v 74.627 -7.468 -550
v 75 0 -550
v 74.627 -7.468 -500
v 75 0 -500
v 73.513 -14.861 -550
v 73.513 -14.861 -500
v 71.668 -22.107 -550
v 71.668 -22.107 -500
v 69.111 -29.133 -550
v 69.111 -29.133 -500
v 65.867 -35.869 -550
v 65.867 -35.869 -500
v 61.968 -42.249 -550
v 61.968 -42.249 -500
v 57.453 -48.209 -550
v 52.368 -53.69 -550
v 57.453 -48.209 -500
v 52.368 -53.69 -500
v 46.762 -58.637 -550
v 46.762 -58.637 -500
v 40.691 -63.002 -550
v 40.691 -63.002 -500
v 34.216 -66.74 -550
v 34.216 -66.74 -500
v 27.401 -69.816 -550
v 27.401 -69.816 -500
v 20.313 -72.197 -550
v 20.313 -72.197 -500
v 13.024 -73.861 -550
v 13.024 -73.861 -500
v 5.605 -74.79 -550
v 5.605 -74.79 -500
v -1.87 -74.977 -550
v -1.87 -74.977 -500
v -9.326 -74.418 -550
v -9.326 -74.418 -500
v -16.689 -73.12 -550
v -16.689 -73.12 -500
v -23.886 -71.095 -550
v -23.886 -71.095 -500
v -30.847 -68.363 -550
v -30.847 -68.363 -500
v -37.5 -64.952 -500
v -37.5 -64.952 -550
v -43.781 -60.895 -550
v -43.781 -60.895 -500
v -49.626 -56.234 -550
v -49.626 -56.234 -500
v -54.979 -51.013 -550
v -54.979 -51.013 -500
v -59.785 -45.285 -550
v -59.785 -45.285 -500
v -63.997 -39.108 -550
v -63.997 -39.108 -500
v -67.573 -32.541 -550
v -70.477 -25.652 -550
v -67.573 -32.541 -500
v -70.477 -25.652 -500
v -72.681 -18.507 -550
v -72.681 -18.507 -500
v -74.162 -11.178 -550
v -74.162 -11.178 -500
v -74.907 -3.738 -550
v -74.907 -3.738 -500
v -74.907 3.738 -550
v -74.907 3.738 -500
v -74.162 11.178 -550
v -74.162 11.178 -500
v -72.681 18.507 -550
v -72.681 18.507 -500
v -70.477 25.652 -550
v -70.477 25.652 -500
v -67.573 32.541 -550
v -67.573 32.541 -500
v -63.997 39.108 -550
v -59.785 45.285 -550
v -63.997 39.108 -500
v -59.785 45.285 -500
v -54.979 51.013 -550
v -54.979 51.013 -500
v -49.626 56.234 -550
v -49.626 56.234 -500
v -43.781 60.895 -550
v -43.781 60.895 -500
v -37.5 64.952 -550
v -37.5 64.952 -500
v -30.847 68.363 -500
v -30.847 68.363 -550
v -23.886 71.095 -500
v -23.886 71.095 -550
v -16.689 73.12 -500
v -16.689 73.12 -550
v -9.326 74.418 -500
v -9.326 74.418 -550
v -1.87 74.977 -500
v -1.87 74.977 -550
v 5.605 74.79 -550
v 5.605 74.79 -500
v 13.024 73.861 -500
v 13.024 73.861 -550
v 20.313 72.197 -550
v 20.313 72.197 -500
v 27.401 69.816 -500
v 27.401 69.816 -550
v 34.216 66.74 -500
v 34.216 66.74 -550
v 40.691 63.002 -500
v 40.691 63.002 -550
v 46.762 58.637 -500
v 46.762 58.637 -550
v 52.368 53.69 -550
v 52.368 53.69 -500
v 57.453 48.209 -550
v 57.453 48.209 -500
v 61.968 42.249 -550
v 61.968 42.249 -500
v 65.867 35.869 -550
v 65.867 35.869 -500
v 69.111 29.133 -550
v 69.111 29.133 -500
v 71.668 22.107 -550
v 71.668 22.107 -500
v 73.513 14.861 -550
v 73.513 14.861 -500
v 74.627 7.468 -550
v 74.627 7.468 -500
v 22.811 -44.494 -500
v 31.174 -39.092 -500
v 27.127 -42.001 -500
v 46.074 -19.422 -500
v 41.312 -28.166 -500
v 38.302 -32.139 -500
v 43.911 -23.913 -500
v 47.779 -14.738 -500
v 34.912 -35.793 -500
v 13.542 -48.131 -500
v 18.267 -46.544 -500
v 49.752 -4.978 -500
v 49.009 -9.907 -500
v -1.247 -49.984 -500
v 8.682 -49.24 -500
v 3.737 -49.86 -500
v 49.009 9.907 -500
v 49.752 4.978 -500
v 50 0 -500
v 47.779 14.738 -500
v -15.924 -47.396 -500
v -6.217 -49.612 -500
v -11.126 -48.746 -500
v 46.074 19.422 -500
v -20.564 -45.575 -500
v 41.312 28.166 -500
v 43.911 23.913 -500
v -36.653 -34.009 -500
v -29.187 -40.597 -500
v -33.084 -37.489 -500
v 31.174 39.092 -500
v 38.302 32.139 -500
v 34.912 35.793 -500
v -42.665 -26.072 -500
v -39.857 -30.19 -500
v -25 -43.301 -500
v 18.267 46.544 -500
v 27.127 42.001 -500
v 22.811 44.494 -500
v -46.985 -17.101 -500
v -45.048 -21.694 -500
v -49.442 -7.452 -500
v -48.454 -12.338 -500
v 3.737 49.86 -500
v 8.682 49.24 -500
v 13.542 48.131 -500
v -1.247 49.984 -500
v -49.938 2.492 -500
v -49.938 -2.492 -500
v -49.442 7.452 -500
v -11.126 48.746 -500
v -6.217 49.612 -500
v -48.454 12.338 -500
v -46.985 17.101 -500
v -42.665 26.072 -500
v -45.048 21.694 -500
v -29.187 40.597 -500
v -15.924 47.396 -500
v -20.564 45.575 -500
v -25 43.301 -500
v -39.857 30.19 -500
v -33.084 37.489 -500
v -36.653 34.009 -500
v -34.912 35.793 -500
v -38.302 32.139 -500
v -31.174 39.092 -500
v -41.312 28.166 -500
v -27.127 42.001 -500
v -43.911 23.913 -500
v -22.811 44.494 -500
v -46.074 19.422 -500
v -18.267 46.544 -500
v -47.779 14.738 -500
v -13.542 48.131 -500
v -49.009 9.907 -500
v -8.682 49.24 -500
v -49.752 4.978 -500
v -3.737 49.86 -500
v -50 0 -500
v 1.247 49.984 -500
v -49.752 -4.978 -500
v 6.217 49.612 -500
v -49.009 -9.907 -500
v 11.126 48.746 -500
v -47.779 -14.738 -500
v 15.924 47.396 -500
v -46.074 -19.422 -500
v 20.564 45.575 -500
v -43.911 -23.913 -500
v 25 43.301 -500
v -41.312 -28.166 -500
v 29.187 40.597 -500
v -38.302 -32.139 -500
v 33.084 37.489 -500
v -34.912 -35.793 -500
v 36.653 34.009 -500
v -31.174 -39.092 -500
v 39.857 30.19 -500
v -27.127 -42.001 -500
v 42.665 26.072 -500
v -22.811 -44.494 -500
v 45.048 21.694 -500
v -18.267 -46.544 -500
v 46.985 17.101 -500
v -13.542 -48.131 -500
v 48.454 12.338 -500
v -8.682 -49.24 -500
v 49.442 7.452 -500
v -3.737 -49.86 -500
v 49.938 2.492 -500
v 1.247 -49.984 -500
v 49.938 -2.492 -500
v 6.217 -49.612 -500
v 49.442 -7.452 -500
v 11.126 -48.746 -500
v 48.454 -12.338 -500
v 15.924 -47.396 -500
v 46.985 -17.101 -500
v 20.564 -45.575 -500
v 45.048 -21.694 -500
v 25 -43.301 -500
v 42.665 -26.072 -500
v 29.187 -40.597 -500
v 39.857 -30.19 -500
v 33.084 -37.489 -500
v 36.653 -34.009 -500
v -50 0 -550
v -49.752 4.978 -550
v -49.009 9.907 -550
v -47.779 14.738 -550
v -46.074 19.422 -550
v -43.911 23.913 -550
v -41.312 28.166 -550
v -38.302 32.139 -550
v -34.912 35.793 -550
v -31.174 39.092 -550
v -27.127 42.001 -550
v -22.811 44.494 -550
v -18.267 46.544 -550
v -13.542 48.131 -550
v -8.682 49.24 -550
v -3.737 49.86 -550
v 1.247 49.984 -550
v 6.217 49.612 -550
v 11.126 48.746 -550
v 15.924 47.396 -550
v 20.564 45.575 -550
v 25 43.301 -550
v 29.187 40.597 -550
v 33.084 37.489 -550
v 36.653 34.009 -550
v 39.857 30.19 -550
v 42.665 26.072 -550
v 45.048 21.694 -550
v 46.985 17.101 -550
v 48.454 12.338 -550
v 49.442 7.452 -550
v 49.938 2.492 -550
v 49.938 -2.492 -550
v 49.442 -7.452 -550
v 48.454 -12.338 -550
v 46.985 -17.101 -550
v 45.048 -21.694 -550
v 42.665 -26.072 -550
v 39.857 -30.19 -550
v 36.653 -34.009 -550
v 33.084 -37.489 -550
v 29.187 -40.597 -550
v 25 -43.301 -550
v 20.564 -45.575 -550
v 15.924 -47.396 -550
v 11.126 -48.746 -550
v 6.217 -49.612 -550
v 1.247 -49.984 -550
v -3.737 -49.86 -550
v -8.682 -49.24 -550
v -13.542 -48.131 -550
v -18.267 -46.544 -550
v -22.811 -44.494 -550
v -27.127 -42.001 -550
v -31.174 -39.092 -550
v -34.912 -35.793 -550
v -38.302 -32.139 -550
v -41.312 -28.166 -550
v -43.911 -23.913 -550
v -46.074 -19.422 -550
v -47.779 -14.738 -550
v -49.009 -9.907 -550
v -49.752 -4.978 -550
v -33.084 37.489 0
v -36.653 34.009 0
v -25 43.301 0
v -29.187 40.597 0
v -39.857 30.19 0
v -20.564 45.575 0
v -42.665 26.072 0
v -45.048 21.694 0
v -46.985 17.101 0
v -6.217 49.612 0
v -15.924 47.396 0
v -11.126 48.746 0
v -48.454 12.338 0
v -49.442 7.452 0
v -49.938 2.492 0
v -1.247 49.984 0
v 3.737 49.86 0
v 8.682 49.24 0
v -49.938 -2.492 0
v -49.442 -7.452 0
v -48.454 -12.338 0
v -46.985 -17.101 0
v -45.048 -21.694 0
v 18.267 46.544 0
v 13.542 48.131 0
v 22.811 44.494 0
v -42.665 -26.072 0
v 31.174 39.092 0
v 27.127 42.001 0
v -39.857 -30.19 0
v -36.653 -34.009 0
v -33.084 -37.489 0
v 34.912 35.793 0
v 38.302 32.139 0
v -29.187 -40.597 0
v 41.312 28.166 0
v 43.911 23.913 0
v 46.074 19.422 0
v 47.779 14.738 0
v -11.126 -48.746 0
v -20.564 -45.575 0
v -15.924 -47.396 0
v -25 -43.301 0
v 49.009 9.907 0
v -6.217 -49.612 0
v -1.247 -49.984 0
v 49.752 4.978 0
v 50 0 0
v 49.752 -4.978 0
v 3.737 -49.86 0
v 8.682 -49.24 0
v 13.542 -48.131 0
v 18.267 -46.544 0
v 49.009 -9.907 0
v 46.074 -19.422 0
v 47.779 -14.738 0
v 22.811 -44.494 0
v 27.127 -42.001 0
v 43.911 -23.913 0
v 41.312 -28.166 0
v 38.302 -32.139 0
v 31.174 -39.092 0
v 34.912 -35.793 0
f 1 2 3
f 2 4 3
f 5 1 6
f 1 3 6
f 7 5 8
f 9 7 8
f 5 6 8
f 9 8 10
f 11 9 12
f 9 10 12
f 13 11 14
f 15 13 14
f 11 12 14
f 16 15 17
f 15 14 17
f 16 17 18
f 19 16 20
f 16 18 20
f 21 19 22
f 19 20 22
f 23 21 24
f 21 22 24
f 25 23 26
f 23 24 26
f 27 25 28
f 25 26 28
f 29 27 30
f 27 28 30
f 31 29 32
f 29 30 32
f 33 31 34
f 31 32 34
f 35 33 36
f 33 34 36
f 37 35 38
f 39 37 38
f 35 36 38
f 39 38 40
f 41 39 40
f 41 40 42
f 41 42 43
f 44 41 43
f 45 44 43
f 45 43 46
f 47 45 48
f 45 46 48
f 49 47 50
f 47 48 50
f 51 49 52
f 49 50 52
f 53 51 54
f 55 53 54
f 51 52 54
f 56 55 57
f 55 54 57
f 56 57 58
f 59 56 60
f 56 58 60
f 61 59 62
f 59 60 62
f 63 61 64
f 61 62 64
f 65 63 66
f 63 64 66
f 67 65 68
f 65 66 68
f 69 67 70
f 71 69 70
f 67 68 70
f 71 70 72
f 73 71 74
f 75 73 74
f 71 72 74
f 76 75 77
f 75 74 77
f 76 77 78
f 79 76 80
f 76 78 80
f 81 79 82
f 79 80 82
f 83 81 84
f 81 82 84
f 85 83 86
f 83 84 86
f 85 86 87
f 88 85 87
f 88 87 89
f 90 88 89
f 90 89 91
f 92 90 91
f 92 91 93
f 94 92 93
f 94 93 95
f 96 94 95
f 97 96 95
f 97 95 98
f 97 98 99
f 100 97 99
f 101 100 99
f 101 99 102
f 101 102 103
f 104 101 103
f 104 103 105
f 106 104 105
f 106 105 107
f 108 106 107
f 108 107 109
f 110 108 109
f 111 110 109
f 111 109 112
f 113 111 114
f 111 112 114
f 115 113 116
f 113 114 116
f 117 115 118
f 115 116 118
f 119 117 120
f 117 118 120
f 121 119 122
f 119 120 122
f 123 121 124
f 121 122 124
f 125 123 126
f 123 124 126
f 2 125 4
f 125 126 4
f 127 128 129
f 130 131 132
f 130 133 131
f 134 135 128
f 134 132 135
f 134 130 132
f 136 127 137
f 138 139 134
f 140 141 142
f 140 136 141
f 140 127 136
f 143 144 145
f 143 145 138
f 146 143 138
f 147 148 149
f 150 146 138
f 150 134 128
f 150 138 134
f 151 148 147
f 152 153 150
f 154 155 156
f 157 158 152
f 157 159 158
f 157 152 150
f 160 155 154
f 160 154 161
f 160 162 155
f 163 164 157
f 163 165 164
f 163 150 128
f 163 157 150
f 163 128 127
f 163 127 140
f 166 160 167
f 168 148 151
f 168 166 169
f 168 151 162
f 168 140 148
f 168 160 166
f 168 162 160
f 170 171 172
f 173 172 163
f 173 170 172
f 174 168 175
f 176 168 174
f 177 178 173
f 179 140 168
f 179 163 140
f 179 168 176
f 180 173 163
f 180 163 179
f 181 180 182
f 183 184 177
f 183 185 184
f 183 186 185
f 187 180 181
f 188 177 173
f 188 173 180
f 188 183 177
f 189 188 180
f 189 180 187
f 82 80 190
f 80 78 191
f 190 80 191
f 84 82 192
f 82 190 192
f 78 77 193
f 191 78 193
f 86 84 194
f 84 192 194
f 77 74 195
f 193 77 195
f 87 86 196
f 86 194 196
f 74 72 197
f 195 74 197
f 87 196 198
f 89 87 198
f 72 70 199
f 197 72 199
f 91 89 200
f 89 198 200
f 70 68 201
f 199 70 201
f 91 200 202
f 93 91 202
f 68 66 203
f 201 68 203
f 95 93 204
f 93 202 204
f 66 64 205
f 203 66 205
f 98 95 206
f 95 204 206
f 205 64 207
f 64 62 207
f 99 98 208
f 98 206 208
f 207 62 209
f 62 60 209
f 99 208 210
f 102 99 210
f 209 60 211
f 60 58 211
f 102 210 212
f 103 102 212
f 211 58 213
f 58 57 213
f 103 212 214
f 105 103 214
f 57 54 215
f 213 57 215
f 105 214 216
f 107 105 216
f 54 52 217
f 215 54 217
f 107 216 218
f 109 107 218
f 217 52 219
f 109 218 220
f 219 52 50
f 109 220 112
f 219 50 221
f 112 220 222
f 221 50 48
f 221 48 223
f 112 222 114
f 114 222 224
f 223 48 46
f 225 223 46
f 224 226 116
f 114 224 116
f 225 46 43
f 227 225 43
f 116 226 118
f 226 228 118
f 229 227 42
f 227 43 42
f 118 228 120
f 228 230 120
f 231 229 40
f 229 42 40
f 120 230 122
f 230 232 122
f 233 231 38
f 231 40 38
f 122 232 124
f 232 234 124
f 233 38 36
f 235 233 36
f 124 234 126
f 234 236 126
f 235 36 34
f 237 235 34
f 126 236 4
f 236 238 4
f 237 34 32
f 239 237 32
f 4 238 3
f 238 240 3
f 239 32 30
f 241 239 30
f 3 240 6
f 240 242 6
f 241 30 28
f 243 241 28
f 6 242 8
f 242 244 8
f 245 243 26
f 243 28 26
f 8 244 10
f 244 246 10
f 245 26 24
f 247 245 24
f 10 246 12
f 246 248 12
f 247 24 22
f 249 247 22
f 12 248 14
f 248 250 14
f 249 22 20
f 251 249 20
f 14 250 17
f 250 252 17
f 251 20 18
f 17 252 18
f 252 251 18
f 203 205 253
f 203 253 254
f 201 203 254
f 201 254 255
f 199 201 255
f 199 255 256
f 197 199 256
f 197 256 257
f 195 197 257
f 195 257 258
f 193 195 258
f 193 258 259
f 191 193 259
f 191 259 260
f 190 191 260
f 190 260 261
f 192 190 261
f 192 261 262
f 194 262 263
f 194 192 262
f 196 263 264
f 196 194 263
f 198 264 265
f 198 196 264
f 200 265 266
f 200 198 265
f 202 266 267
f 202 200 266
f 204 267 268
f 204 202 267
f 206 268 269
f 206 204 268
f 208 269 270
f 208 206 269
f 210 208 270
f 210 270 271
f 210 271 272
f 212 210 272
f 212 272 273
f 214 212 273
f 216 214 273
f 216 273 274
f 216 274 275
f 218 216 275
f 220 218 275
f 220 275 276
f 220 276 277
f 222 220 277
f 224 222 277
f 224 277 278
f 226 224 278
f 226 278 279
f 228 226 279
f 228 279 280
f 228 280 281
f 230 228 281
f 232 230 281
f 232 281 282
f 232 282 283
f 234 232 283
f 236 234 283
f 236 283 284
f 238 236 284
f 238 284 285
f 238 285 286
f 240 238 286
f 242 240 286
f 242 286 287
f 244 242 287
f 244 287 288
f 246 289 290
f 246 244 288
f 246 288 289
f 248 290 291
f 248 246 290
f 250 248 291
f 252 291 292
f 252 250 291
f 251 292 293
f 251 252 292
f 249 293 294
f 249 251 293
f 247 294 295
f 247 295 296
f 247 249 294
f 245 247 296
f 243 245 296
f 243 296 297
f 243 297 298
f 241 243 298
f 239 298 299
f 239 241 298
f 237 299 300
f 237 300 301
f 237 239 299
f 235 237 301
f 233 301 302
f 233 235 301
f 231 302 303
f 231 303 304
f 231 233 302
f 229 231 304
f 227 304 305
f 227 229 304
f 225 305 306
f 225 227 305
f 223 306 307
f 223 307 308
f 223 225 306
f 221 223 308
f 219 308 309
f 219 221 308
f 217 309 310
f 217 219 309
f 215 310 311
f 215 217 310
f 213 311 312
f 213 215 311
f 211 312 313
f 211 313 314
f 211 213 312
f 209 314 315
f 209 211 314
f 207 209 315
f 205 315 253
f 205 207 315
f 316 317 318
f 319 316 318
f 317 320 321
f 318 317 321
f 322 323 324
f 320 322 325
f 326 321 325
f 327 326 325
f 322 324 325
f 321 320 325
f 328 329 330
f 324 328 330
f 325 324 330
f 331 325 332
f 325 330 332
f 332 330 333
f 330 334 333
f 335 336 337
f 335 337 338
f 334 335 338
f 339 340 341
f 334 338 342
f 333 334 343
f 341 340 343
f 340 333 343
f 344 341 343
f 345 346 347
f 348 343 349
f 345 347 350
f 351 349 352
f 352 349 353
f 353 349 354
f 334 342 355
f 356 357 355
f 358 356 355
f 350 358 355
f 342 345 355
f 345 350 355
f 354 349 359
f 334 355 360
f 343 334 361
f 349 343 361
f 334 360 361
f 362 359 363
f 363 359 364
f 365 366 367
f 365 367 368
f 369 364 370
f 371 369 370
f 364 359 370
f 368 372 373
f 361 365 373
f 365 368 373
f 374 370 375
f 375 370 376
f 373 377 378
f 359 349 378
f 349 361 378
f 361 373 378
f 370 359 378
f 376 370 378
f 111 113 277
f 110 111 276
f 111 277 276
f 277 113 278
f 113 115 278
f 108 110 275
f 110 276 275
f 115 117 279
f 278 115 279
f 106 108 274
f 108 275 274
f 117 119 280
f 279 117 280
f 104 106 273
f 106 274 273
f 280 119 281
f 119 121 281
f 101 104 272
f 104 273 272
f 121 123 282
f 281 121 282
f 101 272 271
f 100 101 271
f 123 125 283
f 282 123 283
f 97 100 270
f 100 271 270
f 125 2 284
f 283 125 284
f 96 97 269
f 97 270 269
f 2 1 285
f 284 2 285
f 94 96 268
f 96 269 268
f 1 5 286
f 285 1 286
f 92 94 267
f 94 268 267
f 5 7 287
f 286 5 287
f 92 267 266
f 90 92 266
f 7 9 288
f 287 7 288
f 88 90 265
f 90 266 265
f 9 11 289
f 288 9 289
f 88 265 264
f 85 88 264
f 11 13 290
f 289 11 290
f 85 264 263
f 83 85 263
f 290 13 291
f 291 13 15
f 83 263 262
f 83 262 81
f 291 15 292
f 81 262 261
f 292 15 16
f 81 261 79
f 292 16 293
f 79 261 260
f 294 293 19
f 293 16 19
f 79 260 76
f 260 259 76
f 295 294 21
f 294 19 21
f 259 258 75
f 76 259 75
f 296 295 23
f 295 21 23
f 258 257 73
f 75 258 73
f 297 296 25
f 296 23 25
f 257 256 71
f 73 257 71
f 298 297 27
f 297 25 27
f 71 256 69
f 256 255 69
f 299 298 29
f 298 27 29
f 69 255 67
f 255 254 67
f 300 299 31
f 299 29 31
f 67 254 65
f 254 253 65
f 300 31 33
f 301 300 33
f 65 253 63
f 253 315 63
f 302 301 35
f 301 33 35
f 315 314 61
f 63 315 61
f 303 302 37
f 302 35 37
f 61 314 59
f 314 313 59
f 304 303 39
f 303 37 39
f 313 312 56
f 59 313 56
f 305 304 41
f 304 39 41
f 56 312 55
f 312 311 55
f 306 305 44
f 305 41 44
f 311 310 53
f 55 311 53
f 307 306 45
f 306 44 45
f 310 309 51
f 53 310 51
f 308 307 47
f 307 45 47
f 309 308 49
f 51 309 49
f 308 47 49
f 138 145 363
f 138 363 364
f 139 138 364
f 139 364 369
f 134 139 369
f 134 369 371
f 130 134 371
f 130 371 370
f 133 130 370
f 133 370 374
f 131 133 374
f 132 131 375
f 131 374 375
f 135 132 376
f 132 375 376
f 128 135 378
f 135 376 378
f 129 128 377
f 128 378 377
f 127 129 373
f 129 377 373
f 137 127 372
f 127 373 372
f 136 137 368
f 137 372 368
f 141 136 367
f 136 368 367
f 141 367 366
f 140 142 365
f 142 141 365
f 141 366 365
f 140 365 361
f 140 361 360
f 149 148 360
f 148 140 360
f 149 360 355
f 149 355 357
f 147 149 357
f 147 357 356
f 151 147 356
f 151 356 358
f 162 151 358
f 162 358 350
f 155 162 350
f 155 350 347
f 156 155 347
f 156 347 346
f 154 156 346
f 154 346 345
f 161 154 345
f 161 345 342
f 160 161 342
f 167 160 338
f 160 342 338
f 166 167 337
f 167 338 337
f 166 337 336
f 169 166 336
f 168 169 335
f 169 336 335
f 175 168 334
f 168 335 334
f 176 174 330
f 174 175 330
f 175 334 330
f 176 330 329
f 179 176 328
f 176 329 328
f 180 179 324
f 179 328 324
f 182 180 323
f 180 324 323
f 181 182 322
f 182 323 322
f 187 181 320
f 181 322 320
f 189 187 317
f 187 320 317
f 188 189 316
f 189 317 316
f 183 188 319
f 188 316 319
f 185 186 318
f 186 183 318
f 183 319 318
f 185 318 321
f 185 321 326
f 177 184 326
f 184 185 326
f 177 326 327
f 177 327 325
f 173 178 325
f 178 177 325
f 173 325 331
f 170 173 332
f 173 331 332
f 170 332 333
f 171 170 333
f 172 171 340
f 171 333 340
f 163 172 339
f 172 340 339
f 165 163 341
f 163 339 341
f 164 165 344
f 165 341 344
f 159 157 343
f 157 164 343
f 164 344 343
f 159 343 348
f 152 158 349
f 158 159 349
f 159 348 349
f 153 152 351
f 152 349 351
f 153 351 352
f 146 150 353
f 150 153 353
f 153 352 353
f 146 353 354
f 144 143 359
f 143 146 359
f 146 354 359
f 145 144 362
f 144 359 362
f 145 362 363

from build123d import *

# Parameters (mm, degrees)
CUT_EXTRUDE2_START = -50
SKETCH4_R          = 50
CUT_EXTRUDE2_DEPTH = 50


with BuildPart() as part:
    # Sketch2 → Revolve1 (revolve)
    with BuildSketch(Plane(origin=(0, 0, 0), x_dir=(0, 0, -1), z_dir=(1, 0, 0)), mode=Mode.PRIVATE) as revolve1_sk:
        Polygon((0, 0), (550, 0), (550, -75), (500, -75), (500, -50), (0, -50), align=None)
    revolve(revolve1_sk.sketch.rotate(Axis((0, 0, 0), (0, 0, -1)), 270), axis=Axis((0, 0, 0), (0, 0, -1)))

    # Sketch4 → Cut-Extrude2 (cut)
    with BuildSketch(Plane(origin=(0, 0, -550), x_dir=(-1, 0, 0), z_dir=(0, 0, -1)).offset(CUT_EXTRUDE2_START)):
        Circle(SKETCH4_R)
    extrude(amount=CUT_EXTRUDE2_DEPTH, mode=Mode.SUBTRACT)


with BuildPart() as cut_extrude2_piece_1:
    # of the separate pieces the step leaves, piece 1, a body of its own (cut_extrude2_pieces)
    add(part.part.solids().sort_by_distance((50, 0, 0))[0])


with BuildPart() as cut_extrude2_piece_2:
    # of the separate pieces the step leaves, piece 2, a body of its own (cut_extrude2_pieces)
    add(part.part.solids().sort_by_distance((75, 0, -550))[0])


solid = Compound([cut_extrude2_piece_1.part, cut_extrude2_piece_2.part])
